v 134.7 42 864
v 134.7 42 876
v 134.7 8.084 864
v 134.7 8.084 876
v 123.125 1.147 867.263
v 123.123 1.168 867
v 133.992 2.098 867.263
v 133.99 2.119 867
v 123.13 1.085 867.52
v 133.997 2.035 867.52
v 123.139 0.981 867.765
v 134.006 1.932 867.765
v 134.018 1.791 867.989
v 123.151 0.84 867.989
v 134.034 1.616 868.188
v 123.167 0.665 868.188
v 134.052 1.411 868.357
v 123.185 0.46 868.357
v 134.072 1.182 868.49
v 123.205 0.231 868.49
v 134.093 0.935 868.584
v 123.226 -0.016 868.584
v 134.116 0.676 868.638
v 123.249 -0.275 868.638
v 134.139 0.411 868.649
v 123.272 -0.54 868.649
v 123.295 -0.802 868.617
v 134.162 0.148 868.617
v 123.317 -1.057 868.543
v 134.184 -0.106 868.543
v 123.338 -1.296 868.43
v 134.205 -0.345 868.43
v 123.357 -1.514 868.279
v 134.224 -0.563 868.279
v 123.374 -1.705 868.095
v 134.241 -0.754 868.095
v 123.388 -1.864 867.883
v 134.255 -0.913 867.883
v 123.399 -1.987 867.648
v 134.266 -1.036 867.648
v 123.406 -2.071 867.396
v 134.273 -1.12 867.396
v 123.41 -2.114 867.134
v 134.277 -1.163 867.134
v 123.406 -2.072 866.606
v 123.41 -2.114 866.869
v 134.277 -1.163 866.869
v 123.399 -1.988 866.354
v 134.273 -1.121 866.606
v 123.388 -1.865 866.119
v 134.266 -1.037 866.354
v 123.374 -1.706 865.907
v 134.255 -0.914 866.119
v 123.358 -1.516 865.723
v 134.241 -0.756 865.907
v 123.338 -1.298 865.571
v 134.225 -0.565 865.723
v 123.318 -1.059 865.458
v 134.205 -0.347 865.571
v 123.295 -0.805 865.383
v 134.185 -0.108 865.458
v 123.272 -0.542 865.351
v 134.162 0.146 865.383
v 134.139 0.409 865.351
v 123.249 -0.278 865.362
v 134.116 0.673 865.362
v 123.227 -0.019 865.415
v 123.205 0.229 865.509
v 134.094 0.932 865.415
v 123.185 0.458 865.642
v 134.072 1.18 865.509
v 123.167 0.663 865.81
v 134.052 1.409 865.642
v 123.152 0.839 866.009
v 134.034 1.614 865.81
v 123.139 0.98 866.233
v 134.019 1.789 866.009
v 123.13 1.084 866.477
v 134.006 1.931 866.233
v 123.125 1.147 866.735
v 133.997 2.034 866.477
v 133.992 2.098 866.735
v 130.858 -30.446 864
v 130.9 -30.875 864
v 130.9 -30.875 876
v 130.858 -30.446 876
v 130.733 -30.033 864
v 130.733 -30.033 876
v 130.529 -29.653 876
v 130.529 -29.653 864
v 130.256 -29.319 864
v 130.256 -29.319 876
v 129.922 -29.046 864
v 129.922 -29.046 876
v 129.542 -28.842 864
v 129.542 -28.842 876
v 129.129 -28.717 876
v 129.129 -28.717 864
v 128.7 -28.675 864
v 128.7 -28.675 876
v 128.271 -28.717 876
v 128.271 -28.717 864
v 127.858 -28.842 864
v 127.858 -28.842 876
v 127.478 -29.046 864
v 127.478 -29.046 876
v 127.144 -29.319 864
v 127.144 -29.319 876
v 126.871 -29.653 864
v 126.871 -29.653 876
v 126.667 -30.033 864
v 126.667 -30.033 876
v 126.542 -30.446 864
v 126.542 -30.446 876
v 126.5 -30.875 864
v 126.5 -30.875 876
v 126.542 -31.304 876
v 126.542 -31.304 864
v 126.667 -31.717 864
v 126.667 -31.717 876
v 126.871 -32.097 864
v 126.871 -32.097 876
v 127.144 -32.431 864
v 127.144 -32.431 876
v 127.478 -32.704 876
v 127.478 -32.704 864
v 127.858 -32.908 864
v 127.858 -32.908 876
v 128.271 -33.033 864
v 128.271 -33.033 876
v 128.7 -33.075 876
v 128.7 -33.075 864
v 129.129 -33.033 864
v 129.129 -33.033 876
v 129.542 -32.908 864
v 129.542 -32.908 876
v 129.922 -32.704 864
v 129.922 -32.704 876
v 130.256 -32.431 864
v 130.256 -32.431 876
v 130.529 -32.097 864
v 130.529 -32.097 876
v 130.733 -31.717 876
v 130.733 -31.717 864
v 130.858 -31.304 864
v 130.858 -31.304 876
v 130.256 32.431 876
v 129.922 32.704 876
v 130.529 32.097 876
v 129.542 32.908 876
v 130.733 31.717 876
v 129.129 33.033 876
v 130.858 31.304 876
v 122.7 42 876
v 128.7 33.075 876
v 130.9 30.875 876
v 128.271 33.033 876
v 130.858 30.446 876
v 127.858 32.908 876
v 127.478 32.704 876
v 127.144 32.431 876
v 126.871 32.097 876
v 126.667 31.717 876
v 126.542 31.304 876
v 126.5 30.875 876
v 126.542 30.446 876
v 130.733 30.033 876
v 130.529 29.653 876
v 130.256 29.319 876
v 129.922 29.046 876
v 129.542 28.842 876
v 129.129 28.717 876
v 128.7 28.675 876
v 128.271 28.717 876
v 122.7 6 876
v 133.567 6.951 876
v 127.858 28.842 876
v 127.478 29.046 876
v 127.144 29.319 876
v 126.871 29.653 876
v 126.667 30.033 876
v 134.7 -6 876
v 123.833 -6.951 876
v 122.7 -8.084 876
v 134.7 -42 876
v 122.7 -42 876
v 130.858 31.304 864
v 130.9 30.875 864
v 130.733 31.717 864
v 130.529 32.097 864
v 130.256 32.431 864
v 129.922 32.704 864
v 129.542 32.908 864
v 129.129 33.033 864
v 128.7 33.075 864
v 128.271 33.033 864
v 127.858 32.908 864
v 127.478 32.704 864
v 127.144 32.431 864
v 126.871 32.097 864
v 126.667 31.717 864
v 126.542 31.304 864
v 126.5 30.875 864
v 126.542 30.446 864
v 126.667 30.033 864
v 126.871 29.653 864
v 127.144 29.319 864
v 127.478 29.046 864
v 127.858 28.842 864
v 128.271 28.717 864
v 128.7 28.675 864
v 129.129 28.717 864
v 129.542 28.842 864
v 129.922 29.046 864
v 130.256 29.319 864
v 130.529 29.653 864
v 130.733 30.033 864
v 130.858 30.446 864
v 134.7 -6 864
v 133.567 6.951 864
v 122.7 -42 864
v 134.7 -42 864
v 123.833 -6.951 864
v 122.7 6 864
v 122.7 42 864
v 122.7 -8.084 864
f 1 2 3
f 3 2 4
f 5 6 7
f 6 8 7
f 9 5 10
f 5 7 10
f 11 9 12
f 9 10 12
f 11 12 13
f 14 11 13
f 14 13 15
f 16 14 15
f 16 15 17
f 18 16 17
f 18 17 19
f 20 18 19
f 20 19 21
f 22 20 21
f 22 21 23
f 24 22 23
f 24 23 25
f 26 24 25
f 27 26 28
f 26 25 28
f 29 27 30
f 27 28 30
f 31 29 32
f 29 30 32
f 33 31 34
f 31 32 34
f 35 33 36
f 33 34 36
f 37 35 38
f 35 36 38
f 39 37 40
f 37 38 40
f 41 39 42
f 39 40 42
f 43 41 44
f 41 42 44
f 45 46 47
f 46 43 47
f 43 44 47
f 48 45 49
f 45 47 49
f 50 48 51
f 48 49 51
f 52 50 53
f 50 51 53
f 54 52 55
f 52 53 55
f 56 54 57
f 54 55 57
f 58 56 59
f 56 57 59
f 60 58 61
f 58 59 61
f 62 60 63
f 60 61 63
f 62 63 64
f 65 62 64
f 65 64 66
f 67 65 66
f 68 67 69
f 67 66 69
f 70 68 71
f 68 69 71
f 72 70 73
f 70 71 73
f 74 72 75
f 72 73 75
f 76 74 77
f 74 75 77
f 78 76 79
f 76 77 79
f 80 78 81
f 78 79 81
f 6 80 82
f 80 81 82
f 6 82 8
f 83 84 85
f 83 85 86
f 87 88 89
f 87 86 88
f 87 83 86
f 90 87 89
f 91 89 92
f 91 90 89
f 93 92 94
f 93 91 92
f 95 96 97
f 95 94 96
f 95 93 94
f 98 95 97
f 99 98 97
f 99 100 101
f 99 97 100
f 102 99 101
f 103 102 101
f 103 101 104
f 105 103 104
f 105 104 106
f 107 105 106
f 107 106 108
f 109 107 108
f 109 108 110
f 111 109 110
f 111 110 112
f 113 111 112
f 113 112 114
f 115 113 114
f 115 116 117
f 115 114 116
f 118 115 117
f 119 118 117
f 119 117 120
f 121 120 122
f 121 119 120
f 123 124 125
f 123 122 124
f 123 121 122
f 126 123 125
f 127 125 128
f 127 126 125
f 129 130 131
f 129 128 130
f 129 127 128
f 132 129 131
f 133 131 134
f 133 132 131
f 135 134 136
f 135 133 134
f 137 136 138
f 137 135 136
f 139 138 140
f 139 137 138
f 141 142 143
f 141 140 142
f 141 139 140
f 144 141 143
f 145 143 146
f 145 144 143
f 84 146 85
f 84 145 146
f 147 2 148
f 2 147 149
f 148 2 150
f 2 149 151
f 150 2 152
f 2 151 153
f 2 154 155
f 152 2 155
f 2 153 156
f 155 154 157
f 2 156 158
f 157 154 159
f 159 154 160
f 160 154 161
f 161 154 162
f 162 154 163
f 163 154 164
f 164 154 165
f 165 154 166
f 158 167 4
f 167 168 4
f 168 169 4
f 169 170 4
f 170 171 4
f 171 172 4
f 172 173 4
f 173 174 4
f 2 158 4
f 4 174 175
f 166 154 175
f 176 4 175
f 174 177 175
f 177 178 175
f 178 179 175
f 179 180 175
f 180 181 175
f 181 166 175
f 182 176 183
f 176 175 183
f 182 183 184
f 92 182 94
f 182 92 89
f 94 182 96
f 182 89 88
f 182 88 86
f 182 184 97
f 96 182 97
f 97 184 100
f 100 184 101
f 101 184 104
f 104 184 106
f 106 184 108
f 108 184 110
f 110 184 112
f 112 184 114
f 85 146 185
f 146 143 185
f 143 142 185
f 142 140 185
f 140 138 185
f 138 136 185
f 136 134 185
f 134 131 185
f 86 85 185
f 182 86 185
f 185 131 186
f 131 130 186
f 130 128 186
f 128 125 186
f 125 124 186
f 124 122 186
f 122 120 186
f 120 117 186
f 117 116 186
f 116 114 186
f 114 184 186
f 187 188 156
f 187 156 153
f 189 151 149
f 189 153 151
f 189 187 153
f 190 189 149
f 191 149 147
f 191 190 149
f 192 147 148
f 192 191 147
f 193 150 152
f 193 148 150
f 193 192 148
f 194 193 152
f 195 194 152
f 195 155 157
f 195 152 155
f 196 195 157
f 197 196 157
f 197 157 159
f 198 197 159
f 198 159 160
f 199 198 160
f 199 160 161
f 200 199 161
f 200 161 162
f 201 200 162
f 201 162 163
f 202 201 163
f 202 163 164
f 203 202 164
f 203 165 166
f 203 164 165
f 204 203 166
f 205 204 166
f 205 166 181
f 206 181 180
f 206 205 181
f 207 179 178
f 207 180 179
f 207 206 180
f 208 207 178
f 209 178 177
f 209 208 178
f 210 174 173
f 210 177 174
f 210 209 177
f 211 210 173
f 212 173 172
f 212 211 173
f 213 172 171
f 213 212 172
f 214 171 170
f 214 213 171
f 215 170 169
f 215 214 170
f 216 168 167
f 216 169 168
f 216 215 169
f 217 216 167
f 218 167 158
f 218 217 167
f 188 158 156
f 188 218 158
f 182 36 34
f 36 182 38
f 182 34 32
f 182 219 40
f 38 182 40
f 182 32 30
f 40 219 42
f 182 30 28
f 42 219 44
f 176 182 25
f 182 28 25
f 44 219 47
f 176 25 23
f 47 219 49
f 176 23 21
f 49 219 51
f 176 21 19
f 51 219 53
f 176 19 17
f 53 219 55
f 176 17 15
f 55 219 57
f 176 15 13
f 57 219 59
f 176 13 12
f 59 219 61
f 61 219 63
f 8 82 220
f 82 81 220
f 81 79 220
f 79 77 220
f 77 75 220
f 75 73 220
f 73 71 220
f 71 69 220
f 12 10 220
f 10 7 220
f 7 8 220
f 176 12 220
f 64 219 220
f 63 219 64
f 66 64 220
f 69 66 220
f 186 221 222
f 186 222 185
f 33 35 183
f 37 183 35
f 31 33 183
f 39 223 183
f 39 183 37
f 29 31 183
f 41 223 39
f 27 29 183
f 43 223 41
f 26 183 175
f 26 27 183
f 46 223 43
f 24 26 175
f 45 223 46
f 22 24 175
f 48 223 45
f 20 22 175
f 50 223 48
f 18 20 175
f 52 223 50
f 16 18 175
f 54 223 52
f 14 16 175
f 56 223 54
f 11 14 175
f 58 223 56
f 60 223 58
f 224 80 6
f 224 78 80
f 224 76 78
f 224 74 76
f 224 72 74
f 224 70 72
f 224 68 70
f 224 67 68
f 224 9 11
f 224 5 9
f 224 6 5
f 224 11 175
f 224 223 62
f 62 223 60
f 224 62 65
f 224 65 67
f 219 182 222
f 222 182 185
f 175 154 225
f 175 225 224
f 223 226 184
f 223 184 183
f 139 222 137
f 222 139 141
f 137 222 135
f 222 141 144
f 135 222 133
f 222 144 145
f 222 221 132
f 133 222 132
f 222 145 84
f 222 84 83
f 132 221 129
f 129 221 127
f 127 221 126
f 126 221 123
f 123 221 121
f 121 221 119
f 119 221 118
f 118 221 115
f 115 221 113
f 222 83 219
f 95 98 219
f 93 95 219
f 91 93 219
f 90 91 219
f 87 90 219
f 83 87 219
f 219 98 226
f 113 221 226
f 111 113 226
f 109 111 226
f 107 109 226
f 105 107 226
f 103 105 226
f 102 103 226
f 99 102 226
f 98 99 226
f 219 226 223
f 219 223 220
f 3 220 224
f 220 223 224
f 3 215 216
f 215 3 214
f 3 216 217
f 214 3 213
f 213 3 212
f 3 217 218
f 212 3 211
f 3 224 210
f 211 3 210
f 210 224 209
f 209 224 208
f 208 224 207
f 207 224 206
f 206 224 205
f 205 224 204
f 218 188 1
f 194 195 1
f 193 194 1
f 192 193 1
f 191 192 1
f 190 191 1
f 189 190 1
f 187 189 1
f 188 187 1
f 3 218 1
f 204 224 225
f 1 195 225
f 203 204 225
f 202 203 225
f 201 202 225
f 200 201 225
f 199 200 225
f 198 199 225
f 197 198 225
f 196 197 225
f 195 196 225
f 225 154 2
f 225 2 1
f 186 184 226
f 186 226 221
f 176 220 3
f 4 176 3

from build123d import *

# Parameters (mm, degrees)
PAD007_DEPTH         = 12
SKETCH065_R          = 2.2
POCKET021_DEPTH      = 0.001
POCKET021_DEPTH_BACK = 42.001
SKETCH025_R          = 1.65
POCKET022_DEPTH      = 9.638709
POCKET022_DEPTH_BACK = 9.638709


with BuildPart() as part:
    # Sketch023 → Pad007 (new body)
    with BuildSketch(Plane.YZ):
        Polygon((42, 42), (42, 30), (19.75, 30), (-19.75, 30), (-42, 30), (-42, 42), (-11, 42), (11, 42), align=None)
    extrude(amount=PAD007_DEPTH)

    # Sketch065 → Pocket021 (cut, two sides)
    with BuildSketch(Plane.XY) as pocket021_sk:
        with Locations((6, 30.875)):
            Circle(SKETCH065_R)
        with Locations((6, -30.875)):
            Circle(SKETCH065_R)
        Polygon((10.866975, 6.950634), (13, 9.083659), (13, -5.999897), (12, -5.999897), align=None)
        Polygon((0, 5.999897), (-1, 5.999897), (-1, -9.083659), (1.133025, -6.950634), align=None)
    extrude(amount=-POCKET021_DEPTH, mode=Mode.SUBTRACT)
    extrude(pocket021_sk.sketch, amount=POCKET021_DEPTH_BACK, mode=Mode.SUBTRACT)

    # Sketch025 (on DatumPlane) → Pocket022 (cut, two sides)
    with BuildSketch(Plane(origin=(6, 0, 0), x_dir=(-0.087156, 0.996195, 0), z_dir=(0.996195, 0.087156, 0))) as pocket022_sk:
        with Locations((0, 33)):
            Circle(SKETCH025_R)
    extrude(amount=-POCKET022_DEPTH, mode=Mode.SUBTRACT)
    extrude(pocket022_sk.sketch, amount=POCKET022_DEPTH_BACK, mode=Mode.SUBTRACT)


with BuildPart() as part_1:
    # Body008 placement: moved
    add(part.part.moved(Location((122.7, 0, 834))))


solid = part_1.part
